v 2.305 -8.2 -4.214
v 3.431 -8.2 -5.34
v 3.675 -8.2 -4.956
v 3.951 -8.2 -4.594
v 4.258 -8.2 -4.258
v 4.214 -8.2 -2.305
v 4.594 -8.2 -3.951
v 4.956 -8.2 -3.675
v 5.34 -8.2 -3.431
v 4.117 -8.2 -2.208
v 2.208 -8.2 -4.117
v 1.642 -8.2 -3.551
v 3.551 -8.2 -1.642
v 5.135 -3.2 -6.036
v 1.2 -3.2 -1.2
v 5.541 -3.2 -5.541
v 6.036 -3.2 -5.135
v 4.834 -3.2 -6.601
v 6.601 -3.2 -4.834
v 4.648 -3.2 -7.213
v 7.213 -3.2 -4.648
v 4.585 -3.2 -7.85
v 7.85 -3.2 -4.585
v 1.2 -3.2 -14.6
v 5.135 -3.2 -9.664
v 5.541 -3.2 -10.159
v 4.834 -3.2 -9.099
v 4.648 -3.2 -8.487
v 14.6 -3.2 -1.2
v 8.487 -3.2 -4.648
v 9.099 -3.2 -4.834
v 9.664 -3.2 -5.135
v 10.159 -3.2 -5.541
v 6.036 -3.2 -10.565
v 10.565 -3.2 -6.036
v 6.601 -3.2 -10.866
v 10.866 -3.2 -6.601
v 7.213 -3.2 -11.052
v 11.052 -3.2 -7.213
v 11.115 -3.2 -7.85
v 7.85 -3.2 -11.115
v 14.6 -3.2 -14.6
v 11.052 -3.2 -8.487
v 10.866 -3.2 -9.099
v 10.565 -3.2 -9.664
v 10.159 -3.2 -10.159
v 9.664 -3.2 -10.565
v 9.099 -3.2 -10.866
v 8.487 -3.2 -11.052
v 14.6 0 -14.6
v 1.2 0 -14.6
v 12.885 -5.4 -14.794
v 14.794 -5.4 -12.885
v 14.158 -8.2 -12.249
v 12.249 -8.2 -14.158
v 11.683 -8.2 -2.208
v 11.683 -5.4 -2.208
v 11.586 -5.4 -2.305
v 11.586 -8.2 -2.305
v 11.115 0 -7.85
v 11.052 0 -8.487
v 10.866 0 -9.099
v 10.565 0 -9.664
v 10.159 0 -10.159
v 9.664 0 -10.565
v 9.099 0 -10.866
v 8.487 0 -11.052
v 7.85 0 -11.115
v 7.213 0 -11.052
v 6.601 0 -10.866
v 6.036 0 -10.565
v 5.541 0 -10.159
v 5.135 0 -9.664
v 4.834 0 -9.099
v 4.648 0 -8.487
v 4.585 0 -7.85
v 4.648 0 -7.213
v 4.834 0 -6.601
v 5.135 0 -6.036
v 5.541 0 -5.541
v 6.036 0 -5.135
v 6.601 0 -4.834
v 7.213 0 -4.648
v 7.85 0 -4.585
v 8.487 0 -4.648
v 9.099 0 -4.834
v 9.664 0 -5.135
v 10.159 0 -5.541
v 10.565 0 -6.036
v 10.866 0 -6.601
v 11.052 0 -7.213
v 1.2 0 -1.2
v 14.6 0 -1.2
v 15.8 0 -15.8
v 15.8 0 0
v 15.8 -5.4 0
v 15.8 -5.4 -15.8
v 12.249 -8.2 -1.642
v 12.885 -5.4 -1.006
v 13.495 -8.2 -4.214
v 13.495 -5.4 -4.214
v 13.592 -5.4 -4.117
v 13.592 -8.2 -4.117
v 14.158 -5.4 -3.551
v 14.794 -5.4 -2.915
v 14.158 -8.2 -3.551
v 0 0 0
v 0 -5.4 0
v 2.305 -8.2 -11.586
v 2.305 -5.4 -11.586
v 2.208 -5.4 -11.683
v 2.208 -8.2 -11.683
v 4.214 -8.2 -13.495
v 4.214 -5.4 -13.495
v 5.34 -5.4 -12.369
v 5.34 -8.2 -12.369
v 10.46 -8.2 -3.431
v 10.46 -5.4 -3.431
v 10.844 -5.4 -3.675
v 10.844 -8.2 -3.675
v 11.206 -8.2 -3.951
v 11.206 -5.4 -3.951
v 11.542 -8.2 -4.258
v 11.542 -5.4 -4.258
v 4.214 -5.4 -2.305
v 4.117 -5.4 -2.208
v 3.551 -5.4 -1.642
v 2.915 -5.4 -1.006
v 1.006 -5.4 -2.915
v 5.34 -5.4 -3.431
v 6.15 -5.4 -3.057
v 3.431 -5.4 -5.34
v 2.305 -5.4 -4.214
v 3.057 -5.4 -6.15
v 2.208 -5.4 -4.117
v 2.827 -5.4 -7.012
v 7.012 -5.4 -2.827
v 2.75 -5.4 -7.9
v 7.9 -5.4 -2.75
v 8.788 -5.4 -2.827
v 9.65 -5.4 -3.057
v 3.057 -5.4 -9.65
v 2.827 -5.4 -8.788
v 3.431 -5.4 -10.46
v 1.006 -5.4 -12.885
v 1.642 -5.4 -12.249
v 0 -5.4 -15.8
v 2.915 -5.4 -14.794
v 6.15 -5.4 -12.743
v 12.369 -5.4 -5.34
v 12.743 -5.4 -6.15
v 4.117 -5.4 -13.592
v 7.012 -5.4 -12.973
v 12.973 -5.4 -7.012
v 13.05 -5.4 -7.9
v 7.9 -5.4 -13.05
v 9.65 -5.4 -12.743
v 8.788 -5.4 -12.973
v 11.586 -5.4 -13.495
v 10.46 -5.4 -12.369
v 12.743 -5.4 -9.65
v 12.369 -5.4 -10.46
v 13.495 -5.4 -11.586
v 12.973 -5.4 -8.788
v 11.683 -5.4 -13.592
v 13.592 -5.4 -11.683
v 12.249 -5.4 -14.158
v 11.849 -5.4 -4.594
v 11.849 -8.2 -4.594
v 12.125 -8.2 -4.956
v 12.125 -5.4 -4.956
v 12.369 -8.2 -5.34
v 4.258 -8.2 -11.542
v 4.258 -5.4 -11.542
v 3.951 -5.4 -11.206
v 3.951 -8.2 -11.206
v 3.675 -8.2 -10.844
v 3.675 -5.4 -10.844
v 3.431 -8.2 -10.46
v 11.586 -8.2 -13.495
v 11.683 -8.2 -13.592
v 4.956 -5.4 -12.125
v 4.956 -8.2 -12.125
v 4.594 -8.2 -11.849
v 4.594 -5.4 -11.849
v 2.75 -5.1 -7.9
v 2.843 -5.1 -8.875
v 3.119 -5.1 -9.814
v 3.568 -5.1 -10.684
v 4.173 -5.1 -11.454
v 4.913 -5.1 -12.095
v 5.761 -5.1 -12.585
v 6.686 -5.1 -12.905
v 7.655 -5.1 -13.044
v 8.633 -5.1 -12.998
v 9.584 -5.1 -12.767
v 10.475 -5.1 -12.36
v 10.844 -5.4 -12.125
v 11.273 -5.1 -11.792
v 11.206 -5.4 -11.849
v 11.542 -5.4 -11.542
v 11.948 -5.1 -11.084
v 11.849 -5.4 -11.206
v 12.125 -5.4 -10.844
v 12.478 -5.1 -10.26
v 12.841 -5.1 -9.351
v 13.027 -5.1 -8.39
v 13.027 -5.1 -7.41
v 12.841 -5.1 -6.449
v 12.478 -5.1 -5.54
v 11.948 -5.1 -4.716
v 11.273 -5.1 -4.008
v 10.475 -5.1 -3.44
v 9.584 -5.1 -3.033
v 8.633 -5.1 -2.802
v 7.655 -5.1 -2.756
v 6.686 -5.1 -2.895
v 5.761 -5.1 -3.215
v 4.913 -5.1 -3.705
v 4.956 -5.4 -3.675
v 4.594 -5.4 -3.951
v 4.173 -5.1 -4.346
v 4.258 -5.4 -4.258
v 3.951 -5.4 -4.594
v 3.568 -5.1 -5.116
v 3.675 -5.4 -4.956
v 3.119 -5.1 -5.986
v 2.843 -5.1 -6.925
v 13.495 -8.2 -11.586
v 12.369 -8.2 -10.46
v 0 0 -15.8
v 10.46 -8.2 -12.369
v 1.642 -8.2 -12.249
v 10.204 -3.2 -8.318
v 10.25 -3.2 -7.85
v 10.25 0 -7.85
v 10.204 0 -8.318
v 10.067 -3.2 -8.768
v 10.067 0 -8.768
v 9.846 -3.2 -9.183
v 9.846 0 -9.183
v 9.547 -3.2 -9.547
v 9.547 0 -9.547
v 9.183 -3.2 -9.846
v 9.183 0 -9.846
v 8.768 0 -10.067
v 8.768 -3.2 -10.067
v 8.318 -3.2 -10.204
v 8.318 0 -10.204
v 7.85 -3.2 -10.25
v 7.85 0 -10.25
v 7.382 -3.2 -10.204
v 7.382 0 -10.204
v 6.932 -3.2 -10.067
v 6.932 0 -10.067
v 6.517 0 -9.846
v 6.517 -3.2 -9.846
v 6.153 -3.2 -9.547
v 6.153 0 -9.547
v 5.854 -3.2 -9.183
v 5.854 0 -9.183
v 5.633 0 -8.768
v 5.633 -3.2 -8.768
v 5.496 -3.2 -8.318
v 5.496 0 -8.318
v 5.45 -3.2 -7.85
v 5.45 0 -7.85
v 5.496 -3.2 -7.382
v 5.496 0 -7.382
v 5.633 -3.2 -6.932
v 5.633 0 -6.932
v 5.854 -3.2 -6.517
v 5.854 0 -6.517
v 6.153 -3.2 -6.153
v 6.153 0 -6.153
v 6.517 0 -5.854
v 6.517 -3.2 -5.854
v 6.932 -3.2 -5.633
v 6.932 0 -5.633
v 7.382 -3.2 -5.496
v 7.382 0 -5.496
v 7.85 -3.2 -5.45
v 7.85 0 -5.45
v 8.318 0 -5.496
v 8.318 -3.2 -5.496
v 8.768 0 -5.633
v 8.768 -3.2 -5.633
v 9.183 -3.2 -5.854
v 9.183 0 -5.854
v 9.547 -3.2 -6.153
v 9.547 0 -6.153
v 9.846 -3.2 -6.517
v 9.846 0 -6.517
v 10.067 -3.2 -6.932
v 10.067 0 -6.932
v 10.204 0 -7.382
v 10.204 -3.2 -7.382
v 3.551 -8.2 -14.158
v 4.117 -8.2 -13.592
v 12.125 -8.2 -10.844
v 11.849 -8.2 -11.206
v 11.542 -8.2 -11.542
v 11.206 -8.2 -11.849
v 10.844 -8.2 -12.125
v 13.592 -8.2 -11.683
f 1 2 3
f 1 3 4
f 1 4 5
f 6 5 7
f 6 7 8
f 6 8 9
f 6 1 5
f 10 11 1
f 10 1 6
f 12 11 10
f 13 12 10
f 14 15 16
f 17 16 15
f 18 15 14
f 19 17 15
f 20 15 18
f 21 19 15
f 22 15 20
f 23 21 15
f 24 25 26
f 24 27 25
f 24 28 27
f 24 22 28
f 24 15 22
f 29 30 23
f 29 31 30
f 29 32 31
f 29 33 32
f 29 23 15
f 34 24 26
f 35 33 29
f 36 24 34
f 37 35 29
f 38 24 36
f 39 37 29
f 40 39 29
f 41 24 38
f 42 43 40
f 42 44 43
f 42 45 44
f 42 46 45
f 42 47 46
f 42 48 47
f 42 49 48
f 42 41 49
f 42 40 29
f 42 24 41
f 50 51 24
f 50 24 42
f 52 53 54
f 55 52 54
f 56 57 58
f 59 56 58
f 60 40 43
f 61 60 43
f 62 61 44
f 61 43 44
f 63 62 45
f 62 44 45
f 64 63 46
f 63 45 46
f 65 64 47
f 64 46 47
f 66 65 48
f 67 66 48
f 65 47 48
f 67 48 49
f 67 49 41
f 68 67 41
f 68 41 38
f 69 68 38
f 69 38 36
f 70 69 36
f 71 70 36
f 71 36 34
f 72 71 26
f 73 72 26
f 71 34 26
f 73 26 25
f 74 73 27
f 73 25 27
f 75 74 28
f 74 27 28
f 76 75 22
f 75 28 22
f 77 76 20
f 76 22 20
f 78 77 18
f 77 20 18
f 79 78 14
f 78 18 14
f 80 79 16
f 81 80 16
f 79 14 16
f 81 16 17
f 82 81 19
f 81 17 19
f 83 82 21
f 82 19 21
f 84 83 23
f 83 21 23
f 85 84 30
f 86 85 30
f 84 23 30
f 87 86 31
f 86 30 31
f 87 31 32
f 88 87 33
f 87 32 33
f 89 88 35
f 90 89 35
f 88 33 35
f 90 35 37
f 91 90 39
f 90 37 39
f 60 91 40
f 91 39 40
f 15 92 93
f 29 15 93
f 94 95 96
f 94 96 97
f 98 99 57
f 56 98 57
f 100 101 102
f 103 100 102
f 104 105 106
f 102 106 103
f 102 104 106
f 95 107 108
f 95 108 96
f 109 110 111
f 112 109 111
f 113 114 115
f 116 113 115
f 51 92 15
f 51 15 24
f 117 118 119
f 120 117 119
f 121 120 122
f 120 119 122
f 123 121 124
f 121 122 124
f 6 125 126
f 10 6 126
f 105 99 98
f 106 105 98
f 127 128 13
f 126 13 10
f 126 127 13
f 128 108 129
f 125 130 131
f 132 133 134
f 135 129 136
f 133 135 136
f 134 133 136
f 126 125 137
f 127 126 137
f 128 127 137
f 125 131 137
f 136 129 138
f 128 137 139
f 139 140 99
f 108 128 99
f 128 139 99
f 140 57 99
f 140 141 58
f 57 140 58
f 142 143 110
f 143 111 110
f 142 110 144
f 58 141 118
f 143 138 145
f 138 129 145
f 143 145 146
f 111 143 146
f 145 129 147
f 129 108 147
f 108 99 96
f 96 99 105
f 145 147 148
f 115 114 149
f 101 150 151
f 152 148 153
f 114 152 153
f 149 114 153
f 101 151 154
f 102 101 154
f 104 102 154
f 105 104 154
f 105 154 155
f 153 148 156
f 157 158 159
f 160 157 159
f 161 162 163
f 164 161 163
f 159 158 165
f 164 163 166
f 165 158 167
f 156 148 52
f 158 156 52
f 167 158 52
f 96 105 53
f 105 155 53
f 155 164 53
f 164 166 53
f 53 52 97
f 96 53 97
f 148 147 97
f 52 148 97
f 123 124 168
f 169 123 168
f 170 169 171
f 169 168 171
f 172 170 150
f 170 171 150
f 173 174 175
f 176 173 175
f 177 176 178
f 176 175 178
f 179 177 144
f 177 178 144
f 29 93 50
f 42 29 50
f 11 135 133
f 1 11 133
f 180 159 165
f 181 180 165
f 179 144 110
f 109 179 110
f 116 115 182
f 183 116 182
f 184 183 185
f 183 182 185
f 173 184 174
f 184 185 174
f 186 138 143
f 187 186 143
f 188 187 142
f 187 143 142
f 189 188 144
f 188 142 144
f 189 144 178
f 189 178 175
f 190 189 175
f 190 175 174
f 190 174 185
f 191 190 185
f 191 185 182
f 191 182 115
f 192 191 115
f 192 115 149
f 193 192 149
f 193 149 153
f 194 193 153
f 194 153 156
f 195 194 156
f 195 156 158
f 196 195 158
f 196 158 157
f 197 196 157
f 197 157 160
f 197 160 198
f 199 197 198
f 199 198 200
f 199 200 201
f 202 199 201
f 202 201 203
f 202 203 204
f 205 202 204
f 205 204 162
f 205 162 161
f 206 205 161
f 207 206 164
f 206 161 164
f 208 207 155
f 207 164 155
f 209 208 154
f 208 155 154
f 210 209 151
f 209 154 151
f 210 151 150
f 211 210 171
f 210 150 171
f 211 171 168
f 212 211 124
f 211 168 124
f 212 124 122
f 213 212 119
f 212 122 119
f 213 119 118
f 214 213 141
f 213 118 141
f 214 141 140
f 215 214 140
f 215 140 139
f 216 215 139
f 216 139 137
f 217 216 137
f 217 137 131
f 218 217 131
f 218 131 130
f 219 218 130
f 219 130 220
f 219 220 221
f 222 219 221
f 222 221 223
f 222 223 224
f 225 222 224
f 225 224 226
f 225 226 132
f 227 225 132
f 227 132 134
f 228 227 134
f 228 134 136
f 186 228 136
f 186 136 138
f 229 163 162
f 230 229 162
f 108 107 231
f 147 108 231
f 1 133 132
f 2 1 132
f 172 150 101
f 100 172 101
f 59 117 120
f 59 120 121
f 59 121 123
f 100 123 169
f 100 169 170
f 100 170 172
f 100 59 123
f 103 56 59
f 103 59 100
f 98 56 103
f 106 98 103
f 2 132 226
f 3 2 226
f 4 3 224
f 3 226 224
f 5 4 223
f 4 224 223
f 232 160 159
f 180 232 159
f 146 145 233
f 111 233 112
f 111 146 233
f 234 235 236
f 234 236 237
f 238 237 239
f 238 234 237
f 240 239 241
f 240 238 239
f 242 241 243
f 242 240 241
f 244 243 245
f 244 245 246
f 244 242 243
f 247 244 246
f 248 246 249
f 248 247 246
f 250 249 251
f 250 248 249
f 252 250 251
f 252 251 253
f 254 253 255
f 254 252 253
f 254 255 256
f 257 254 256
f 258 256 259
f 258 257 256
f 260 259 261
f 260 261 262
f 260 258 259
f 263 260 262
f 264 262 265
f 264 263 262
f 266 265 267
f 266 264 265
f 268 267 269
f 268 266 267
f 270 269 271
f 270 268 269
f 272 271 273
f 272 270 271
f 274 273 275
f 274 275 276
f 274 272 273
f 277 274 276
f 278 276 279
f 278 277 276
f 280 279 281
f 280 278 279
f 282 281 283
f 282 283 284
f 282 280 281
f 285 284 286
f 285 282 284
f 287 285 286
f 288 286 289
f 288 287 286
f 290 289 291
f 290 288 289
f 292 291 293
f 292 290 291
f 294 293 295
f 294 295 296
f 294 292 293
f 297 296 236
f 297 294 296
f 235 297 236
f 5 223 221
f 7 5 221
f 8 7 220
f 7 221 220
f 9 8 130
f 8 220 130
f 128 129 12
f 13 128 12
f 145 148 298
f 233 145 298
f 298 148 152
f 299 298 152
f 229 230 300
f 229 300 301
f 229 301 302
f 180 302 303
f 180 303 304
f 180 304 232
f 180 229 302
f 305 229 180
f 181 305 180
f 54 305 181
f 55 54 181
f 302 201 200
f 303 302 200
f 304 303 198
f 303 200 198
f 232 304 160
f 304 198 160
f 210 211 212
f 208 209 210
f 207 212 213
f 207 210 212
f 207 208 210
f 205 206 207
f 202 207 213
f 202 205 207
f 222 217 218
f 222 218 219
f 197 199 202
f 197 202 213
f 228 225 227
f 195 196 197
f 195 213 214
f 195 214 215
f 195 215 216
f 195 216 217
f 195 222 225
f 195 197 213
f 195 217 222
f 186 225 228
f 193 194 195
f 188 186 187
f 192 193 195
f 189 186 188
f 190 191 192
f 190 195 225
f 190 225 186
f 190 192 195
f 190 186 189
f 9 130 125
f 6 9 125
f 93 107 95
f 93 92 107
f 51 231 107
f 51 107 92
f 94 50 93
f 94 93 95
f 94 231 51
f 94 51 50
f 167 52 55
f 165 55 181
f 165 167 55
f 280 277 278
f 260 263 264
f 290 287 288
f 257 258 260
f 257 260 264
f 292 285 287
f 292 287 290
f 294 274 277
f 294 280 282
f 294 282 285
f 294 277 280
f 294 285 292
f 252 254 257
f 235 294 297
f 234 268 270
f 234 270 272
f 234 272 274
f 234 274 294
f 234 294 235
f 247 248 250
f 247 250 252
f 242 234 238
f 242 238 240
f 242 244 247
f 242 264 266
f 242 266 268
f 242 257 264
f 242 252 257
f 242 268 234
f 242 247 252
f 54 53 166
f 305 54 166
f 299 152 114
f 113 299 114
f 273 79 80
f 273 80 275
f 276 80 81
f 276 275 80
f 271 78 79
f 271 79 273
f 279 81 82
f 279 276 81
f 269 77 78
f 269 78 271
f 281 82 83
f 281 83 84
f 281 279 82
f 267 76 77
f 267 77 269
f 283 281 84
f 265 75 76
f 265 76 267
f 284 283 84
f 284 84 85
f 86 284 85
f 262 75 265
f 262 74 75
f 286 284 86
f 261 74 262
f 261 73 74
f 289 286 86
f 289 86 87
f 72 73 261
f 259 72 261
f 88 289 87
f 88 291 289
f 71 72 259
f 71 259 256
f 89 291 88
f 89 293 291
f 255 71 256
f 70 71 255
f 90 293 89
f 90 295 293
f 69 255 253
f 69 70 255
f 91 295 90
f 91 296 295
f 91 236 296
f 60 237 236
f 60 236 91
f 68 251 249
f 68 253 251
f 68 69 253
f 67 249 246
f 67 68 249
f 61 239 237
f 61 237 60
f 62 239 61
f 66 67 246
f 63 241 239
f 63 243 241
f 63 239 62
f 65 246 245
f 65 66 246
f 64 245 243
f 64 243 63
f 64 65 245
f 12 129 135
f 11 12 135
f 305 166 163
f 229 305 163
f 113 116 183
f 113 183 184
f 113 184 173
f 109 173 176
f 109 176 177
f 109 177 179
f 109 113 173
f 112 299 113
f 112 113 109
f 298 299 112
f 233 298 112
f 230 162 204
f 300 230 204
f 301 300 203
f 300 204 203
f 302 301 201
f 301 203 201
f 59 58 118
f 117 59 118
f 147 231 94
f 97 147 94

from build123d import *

# Parameters (mm, degrees)
SKETCH2_W            = 15.8
SKETCH2_H            = 15.8
BOSS_EXTRUDE2_DEPTH  = 5.4
SKETCH4_W            = 13.4
SKETCH4_H            = 13.4
CUT_EXTRUDE1_DEPTH   = 3.2
SKETCH7_R            = 3.265
SKETCH7_R_2          = 2.4
BOSS_EXTRUDE5_DEPTH  = 3.2
SKETCH8_R            = 5.15
CUT_EXTRUDE2_DEPTH   = 0.3
BOSS_EXTRUDE8_DEPTH  = 2.8
BOSS_EXTRUDE11_DEPTH = 2.7
CIRPATTERN1_COUNT    = 4


with BuildPart() as part:
    # Sketch2 → Boss-Extrude2 (new body)
    with BuildSketch(Plane(origin=(0, 0, 0), x_dir=(1, 0, 0), z_dir=(0, 1, 0))):
        with Locations((7.9, 7.9)):
            Rectangle(SKETCH2_W, SKETCH2_H)
    extrude(amount=-BOSS_EXTRUDE2_DEPTH)

    # Sketch4 → Cut-Extrude1 (cut)
    with BuildSketch(Plane(origin=(0, 0, 0), x_dir=(1, 0, 0), z_dir=(0, 1, 0))):
        with Locations((7.9, 7.9)):
            Rectangle(SKETCH4_W, SKETCH4_H)
    extrude(amount=-CUT_EXTRUDE1_DEPTH, mode=Mode.SUBTRACT)

    # Sketch7 → Boss-Extrude5 (add)
    with BuildSketch(Plane(origin=(0, -3.2, 0), x_dir=(1, 0, 0), z_dir=(0, 1, 0))):
        with Locations((7.85, 7.85)):
            Circle(SKETCH7_R)
        with Locations((7.85, 7.85)):
            Circle(SKETCH7_R_2, mode=Mode.SUBTRACT)
    extrude(amount=BOSS_EXTRUDE5_DEPTH)

    # Sketch8 → Cut-Extrude2 (cut)
    with BuildSketch(Plane(origin=(0, -5.4, 0), x_dir=(-1, 0, 0), z_dir=(0, -1, 0))):
        with Locations((-7.9, 7.9)):
            Circle(SKETCH8_R)
    extrude(amount=-CUT_EXTRUDE2_DEPTH, mode=Mode.SUBTRACT)

    # Sketch11 → Boss-Extrude8 (add)
    with BuildSketch(Plane.XZ.offset(5.4)):
        Polygon((11.683021279, -2.207790411), (12.637615434, -3.162384566), (13.203300859, -2.596699141), (12.248706704, -1.642104986), align=None)
        with BuildLine():
            ThreePointArc((11.585853022, -2.304958669), (12.133497372, -2.706975833), (12.637615434, -3.162384566))
            Line((12.637615434, -3.162384566), (11.683021279, -2.207790411))
            Line((11.683021279, -2.207790411), (11.585853022, -2.304958669))
        make_face()
        with BuildLine():
            ThreePointArc((10.459662524, -3.431149167), (11.028098464, -3.808851017), (11.541599923, -4.258400077))
            Line((11.541599923, -4.258400077), (12.637615434, -3.162384566))
            ThreePointArc((12.637615434, -3.162384566), (12.133497372, -2.706975833), (11.585853022, -2.304958669))
            Line((11.585853022, -2.304958669), (10.459662524, -3.431149167))
        make_face()
        with BuildLine():
            Line((12.637615434, -3.162384566), (11.541599923, -4.258400077))
            ThreePointArc((11.541599923, -4.258400077), (11.991148983, -4.771901536), (12.368850833, -5.340337476))
            Line((12.368850833, -5.340337476), (13.495041331, -4.214146978))
            ThreePointArc((13.495041331, -4.214146978), (13.093024167, -3.666502628), (12.637615434, -3.162384566))
        make_face()
        with BuildLine():
            Line((13.592209589, -4.116978721), (12.637615434, -3.162384566))
            ThreePointArc((12.637615434, -3.162384566), (13.093024167, -3.666502628), (13.495041331, -4.214146978))
            Line((13.495041331, -4.214146978), (13.592209589, -4.116978721))
        make_face()
        Polygon((13.203300859, -2.596699141), (12.637615434, -3.162384566), (13.592209589, -4.116978721), (14.157895014, -3.551293296), align=None)
    boss_extrude8 = extrude(amount=BOSS_EXTRUDE8_DEPTH)

    # Sketch29 → Boss-Extrude11 (add)
    with BuildSketch(Plane(origin=(6.945405845, 0, -6.945405845), x_dir=(0.707106781, 0, 0.707106781), z_dir=(-0.707106781, 0, 0.707106781))):
        Polygon((7.5, -8.2), (7.5, -5.4), (8.4, -5.4), align=None)
    boss_extrude11 = extrude(amount=-BOSS_EXTRUDE11_DEPTH)

    # CirPattern1: Boss-Extrude8, Boss-Extrude11 ×4 about axis
    cirpattern1_axis = Axis((7.9, 0, -7.9), (0, 1, 0))
    for i in range(1, CIRPATTERN1_COUNT):
        add(boss_extrude8.rotate(cirpattern1_axis, i * 360 / CIRPATTERN1_COUNT))
        add(boss_extrude11.rotate(cirpattern1_axis, i * 360 / CIRPATTERN1_COUNT))


solid = part.part
